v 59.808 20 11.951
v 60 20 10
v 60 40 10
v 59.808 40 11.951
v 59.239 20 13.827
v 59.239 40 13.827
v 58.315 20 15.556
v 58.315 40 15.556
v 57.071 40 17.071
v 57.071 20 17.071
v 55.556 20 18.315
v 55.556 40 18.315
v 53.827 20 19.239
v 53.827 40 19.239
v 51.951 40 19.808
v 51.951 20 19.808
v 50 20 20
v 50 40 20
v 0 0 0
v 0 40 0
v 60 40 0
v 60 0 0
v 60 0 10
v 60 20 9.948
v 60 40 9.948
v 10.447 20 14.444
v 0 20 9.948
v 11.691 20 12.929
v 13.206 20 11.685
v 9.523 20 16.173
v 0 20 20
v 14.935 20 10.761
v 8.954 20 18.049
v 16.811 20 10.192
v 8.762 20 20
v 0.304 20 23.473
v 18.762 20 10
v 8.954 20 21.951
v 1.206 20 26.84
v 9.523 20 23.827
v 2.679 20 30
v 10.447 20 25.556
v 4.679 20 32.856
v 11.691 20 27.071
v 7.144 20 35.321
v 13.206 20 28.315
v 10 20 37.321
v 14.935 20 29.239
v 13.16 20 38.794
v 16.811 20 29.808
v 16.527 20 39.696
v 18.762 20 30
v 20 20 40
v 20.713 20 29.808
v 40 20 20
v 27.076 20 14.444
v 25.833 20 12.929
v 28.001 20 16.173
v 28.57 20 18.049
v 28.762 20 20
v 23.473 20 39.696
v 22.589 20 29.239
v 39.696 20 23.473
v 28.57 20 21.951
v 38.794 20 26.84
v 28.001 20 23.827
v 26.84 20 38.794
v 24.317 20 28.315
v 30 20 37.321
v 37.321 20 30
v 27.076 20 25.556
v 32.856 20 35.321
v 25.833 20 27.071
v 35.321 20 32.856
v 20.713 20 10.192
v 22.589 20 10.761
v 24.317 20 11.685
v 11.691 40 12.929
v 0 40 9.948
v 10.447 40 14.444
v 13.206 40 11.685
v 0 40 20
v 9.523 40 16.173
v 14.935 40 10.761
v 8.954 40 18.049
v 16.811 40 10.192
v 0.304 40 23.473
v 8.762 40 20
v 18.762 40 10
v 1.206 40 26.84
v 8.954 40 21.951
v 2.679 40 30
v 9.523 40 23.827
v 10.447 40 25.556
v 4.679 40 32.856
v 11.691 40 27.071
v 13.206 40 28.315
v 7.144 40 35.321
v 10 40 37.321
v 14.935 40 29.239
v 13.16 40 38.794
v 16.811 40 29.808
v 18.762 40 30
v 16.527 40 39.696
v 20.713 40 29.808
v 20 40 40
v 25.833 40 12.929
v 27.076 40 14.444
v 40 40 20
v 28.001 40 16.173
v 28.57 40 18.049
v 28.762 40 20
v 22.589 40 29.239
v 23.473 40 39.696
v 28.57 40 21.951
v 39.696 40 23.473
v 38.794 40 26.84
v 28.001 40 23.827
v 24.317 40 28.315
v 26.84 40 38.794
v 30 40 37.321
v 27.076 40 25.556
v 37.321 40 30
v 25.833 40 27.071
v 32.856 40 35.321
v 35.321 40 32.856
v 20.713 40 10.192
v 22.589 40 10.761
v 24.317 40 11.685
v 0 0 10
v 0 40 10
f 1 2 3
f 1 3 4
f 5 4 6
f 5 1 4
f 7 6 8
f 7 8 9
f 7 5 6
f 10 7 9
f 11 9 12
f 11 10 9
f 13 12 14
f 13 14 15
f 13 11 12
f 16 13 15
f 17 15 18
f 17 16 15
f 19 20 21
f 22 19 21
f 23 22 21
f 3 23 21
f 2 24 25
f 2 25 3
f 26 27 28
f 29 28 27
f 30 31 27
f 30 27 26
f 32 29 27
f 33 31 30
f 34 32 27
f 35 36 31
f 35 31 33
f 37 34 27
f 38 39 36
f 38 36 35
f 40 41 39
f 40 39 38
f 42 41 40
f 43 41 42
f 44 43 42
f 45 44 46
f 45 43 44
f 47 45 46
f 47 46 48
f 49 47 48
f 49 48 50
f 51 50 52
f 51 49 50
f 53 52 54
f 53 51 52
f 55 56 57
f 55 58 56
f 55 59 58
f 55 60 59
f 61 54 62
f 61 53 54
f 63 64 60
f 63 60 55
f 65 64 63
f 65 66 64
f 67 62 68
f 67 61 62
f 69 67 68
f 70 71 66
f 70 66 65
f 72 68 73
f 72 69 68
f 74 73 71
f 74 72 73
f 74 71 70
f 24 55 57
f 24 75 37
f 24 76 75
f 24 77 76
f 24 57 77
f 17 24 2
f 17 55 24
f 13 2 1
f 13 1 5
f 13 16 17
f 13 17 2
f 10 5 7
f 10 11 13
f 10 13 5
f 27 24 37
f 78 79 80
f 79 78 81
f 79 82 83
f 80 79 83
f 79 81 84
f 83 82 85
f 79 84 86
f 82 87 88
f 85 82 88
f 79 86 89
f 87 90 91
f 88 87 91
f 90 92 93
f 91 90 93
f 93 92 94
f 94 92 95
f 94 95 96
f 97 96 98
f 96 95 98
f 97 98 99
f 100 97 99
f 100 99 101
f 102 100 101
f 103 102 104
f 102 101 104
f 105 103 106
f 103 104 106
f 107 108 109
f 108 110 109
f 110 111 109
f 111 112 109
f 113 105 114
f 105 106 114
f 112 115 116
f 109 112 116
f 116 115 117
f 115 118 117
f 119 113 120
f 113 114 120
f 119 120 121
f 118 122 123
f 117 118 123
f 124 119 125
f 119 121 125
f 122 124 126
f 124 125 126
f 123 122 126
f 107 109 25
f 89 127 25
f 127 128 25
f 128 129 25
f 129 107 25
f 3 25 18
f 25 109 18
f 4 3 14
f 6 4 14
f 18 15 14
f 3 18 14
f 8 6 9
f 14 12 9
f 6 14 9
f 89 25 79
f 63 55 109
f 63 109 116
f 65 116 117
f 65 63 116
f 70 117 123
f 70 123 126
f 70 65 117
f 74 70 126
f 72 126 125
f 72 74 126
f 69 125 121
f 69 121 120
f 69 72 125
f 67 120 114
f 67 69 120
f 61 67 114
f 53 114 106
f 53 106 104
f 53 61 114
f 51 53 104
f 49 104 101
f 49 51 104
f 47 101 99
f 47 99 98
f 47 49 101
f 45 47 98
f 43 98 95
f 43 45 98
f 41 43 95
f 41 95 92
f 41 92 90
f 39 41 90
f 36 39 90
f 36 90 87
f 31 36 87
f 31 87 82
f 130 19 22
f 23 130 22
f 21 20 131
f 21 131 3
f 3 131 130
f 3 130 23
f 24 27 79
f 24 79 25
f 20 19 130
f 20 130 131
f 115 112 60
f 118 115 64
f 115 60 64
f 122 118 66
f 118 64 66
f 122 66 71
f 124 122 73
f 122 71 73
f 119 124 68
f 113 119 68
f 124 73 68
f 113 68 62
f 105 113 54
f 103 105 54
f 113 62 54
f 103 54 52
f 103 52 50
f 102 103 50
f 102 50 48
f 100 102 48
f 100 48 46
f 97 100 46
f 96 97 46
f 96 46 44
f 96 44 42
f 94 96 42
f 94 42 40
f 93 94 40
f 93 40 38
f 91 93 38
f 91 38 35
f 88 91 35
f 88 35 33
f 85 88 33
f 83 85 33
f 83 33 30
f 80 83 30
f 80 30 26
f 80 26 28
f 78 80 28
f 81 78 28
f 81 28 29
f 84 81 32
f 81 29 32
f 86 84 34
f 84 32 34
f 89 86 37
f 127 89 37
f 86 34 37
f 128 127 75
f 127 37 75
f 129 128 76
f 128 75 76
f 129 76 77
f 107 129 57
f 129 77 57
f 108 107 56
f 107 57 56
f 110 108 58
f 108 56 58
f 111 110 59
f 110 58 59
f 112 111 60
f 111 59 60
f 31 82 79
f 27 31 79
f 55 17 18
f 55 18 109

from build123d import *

# Parameters (mm, degrees)
F0_W     = 60
F0_H     = 40
F1_DEPTH = 10
F3_START = -20
F3_DEPTH = 20
F4_R     = 10
F5_DEPTH = 25


with BuildPart() as f1:
    # F0 (on Top) → F1 (new body)
    with BuildSketch(Plane.XY):
        with Locations((30, 20)):
            Rectangle(F0_W, F0_H)
    extrude(amount=F1_DEPTH)


with BuildPart() as f3:
    # F2 (on Front) → F3 (new body)
    with BuildSketch(Plane.XZ.offset(F3_START)):
        with BuildLine():
            Line((50, 20), (40, 20))
            ThreePointArc((40, 20), (20, 40), (0, 20))
            Line((0, 20), (0, 9.9481726065))
            Line((0, 9.9481726065), (60, 9.9481726065))
            Line((60, 9.9481726065), (60, 10))
            ThreePointArc((60, 10), (57.0710678119, 17.0710678119), (50, 20))
        make_face()
    extrude(amount=-F3_DEPTH)

    # F4 (on face) → F5 (cut)
    with BuildSketch(Plane.XZ.offset(-20)):
        with Locations((18.7617558986, 20)):
            Circle(F4_R)
    extrude(amount=-F5_DEPTH, mode=Mode.SUBTRACT)


solid = Compound([f1.part, f3.part])
